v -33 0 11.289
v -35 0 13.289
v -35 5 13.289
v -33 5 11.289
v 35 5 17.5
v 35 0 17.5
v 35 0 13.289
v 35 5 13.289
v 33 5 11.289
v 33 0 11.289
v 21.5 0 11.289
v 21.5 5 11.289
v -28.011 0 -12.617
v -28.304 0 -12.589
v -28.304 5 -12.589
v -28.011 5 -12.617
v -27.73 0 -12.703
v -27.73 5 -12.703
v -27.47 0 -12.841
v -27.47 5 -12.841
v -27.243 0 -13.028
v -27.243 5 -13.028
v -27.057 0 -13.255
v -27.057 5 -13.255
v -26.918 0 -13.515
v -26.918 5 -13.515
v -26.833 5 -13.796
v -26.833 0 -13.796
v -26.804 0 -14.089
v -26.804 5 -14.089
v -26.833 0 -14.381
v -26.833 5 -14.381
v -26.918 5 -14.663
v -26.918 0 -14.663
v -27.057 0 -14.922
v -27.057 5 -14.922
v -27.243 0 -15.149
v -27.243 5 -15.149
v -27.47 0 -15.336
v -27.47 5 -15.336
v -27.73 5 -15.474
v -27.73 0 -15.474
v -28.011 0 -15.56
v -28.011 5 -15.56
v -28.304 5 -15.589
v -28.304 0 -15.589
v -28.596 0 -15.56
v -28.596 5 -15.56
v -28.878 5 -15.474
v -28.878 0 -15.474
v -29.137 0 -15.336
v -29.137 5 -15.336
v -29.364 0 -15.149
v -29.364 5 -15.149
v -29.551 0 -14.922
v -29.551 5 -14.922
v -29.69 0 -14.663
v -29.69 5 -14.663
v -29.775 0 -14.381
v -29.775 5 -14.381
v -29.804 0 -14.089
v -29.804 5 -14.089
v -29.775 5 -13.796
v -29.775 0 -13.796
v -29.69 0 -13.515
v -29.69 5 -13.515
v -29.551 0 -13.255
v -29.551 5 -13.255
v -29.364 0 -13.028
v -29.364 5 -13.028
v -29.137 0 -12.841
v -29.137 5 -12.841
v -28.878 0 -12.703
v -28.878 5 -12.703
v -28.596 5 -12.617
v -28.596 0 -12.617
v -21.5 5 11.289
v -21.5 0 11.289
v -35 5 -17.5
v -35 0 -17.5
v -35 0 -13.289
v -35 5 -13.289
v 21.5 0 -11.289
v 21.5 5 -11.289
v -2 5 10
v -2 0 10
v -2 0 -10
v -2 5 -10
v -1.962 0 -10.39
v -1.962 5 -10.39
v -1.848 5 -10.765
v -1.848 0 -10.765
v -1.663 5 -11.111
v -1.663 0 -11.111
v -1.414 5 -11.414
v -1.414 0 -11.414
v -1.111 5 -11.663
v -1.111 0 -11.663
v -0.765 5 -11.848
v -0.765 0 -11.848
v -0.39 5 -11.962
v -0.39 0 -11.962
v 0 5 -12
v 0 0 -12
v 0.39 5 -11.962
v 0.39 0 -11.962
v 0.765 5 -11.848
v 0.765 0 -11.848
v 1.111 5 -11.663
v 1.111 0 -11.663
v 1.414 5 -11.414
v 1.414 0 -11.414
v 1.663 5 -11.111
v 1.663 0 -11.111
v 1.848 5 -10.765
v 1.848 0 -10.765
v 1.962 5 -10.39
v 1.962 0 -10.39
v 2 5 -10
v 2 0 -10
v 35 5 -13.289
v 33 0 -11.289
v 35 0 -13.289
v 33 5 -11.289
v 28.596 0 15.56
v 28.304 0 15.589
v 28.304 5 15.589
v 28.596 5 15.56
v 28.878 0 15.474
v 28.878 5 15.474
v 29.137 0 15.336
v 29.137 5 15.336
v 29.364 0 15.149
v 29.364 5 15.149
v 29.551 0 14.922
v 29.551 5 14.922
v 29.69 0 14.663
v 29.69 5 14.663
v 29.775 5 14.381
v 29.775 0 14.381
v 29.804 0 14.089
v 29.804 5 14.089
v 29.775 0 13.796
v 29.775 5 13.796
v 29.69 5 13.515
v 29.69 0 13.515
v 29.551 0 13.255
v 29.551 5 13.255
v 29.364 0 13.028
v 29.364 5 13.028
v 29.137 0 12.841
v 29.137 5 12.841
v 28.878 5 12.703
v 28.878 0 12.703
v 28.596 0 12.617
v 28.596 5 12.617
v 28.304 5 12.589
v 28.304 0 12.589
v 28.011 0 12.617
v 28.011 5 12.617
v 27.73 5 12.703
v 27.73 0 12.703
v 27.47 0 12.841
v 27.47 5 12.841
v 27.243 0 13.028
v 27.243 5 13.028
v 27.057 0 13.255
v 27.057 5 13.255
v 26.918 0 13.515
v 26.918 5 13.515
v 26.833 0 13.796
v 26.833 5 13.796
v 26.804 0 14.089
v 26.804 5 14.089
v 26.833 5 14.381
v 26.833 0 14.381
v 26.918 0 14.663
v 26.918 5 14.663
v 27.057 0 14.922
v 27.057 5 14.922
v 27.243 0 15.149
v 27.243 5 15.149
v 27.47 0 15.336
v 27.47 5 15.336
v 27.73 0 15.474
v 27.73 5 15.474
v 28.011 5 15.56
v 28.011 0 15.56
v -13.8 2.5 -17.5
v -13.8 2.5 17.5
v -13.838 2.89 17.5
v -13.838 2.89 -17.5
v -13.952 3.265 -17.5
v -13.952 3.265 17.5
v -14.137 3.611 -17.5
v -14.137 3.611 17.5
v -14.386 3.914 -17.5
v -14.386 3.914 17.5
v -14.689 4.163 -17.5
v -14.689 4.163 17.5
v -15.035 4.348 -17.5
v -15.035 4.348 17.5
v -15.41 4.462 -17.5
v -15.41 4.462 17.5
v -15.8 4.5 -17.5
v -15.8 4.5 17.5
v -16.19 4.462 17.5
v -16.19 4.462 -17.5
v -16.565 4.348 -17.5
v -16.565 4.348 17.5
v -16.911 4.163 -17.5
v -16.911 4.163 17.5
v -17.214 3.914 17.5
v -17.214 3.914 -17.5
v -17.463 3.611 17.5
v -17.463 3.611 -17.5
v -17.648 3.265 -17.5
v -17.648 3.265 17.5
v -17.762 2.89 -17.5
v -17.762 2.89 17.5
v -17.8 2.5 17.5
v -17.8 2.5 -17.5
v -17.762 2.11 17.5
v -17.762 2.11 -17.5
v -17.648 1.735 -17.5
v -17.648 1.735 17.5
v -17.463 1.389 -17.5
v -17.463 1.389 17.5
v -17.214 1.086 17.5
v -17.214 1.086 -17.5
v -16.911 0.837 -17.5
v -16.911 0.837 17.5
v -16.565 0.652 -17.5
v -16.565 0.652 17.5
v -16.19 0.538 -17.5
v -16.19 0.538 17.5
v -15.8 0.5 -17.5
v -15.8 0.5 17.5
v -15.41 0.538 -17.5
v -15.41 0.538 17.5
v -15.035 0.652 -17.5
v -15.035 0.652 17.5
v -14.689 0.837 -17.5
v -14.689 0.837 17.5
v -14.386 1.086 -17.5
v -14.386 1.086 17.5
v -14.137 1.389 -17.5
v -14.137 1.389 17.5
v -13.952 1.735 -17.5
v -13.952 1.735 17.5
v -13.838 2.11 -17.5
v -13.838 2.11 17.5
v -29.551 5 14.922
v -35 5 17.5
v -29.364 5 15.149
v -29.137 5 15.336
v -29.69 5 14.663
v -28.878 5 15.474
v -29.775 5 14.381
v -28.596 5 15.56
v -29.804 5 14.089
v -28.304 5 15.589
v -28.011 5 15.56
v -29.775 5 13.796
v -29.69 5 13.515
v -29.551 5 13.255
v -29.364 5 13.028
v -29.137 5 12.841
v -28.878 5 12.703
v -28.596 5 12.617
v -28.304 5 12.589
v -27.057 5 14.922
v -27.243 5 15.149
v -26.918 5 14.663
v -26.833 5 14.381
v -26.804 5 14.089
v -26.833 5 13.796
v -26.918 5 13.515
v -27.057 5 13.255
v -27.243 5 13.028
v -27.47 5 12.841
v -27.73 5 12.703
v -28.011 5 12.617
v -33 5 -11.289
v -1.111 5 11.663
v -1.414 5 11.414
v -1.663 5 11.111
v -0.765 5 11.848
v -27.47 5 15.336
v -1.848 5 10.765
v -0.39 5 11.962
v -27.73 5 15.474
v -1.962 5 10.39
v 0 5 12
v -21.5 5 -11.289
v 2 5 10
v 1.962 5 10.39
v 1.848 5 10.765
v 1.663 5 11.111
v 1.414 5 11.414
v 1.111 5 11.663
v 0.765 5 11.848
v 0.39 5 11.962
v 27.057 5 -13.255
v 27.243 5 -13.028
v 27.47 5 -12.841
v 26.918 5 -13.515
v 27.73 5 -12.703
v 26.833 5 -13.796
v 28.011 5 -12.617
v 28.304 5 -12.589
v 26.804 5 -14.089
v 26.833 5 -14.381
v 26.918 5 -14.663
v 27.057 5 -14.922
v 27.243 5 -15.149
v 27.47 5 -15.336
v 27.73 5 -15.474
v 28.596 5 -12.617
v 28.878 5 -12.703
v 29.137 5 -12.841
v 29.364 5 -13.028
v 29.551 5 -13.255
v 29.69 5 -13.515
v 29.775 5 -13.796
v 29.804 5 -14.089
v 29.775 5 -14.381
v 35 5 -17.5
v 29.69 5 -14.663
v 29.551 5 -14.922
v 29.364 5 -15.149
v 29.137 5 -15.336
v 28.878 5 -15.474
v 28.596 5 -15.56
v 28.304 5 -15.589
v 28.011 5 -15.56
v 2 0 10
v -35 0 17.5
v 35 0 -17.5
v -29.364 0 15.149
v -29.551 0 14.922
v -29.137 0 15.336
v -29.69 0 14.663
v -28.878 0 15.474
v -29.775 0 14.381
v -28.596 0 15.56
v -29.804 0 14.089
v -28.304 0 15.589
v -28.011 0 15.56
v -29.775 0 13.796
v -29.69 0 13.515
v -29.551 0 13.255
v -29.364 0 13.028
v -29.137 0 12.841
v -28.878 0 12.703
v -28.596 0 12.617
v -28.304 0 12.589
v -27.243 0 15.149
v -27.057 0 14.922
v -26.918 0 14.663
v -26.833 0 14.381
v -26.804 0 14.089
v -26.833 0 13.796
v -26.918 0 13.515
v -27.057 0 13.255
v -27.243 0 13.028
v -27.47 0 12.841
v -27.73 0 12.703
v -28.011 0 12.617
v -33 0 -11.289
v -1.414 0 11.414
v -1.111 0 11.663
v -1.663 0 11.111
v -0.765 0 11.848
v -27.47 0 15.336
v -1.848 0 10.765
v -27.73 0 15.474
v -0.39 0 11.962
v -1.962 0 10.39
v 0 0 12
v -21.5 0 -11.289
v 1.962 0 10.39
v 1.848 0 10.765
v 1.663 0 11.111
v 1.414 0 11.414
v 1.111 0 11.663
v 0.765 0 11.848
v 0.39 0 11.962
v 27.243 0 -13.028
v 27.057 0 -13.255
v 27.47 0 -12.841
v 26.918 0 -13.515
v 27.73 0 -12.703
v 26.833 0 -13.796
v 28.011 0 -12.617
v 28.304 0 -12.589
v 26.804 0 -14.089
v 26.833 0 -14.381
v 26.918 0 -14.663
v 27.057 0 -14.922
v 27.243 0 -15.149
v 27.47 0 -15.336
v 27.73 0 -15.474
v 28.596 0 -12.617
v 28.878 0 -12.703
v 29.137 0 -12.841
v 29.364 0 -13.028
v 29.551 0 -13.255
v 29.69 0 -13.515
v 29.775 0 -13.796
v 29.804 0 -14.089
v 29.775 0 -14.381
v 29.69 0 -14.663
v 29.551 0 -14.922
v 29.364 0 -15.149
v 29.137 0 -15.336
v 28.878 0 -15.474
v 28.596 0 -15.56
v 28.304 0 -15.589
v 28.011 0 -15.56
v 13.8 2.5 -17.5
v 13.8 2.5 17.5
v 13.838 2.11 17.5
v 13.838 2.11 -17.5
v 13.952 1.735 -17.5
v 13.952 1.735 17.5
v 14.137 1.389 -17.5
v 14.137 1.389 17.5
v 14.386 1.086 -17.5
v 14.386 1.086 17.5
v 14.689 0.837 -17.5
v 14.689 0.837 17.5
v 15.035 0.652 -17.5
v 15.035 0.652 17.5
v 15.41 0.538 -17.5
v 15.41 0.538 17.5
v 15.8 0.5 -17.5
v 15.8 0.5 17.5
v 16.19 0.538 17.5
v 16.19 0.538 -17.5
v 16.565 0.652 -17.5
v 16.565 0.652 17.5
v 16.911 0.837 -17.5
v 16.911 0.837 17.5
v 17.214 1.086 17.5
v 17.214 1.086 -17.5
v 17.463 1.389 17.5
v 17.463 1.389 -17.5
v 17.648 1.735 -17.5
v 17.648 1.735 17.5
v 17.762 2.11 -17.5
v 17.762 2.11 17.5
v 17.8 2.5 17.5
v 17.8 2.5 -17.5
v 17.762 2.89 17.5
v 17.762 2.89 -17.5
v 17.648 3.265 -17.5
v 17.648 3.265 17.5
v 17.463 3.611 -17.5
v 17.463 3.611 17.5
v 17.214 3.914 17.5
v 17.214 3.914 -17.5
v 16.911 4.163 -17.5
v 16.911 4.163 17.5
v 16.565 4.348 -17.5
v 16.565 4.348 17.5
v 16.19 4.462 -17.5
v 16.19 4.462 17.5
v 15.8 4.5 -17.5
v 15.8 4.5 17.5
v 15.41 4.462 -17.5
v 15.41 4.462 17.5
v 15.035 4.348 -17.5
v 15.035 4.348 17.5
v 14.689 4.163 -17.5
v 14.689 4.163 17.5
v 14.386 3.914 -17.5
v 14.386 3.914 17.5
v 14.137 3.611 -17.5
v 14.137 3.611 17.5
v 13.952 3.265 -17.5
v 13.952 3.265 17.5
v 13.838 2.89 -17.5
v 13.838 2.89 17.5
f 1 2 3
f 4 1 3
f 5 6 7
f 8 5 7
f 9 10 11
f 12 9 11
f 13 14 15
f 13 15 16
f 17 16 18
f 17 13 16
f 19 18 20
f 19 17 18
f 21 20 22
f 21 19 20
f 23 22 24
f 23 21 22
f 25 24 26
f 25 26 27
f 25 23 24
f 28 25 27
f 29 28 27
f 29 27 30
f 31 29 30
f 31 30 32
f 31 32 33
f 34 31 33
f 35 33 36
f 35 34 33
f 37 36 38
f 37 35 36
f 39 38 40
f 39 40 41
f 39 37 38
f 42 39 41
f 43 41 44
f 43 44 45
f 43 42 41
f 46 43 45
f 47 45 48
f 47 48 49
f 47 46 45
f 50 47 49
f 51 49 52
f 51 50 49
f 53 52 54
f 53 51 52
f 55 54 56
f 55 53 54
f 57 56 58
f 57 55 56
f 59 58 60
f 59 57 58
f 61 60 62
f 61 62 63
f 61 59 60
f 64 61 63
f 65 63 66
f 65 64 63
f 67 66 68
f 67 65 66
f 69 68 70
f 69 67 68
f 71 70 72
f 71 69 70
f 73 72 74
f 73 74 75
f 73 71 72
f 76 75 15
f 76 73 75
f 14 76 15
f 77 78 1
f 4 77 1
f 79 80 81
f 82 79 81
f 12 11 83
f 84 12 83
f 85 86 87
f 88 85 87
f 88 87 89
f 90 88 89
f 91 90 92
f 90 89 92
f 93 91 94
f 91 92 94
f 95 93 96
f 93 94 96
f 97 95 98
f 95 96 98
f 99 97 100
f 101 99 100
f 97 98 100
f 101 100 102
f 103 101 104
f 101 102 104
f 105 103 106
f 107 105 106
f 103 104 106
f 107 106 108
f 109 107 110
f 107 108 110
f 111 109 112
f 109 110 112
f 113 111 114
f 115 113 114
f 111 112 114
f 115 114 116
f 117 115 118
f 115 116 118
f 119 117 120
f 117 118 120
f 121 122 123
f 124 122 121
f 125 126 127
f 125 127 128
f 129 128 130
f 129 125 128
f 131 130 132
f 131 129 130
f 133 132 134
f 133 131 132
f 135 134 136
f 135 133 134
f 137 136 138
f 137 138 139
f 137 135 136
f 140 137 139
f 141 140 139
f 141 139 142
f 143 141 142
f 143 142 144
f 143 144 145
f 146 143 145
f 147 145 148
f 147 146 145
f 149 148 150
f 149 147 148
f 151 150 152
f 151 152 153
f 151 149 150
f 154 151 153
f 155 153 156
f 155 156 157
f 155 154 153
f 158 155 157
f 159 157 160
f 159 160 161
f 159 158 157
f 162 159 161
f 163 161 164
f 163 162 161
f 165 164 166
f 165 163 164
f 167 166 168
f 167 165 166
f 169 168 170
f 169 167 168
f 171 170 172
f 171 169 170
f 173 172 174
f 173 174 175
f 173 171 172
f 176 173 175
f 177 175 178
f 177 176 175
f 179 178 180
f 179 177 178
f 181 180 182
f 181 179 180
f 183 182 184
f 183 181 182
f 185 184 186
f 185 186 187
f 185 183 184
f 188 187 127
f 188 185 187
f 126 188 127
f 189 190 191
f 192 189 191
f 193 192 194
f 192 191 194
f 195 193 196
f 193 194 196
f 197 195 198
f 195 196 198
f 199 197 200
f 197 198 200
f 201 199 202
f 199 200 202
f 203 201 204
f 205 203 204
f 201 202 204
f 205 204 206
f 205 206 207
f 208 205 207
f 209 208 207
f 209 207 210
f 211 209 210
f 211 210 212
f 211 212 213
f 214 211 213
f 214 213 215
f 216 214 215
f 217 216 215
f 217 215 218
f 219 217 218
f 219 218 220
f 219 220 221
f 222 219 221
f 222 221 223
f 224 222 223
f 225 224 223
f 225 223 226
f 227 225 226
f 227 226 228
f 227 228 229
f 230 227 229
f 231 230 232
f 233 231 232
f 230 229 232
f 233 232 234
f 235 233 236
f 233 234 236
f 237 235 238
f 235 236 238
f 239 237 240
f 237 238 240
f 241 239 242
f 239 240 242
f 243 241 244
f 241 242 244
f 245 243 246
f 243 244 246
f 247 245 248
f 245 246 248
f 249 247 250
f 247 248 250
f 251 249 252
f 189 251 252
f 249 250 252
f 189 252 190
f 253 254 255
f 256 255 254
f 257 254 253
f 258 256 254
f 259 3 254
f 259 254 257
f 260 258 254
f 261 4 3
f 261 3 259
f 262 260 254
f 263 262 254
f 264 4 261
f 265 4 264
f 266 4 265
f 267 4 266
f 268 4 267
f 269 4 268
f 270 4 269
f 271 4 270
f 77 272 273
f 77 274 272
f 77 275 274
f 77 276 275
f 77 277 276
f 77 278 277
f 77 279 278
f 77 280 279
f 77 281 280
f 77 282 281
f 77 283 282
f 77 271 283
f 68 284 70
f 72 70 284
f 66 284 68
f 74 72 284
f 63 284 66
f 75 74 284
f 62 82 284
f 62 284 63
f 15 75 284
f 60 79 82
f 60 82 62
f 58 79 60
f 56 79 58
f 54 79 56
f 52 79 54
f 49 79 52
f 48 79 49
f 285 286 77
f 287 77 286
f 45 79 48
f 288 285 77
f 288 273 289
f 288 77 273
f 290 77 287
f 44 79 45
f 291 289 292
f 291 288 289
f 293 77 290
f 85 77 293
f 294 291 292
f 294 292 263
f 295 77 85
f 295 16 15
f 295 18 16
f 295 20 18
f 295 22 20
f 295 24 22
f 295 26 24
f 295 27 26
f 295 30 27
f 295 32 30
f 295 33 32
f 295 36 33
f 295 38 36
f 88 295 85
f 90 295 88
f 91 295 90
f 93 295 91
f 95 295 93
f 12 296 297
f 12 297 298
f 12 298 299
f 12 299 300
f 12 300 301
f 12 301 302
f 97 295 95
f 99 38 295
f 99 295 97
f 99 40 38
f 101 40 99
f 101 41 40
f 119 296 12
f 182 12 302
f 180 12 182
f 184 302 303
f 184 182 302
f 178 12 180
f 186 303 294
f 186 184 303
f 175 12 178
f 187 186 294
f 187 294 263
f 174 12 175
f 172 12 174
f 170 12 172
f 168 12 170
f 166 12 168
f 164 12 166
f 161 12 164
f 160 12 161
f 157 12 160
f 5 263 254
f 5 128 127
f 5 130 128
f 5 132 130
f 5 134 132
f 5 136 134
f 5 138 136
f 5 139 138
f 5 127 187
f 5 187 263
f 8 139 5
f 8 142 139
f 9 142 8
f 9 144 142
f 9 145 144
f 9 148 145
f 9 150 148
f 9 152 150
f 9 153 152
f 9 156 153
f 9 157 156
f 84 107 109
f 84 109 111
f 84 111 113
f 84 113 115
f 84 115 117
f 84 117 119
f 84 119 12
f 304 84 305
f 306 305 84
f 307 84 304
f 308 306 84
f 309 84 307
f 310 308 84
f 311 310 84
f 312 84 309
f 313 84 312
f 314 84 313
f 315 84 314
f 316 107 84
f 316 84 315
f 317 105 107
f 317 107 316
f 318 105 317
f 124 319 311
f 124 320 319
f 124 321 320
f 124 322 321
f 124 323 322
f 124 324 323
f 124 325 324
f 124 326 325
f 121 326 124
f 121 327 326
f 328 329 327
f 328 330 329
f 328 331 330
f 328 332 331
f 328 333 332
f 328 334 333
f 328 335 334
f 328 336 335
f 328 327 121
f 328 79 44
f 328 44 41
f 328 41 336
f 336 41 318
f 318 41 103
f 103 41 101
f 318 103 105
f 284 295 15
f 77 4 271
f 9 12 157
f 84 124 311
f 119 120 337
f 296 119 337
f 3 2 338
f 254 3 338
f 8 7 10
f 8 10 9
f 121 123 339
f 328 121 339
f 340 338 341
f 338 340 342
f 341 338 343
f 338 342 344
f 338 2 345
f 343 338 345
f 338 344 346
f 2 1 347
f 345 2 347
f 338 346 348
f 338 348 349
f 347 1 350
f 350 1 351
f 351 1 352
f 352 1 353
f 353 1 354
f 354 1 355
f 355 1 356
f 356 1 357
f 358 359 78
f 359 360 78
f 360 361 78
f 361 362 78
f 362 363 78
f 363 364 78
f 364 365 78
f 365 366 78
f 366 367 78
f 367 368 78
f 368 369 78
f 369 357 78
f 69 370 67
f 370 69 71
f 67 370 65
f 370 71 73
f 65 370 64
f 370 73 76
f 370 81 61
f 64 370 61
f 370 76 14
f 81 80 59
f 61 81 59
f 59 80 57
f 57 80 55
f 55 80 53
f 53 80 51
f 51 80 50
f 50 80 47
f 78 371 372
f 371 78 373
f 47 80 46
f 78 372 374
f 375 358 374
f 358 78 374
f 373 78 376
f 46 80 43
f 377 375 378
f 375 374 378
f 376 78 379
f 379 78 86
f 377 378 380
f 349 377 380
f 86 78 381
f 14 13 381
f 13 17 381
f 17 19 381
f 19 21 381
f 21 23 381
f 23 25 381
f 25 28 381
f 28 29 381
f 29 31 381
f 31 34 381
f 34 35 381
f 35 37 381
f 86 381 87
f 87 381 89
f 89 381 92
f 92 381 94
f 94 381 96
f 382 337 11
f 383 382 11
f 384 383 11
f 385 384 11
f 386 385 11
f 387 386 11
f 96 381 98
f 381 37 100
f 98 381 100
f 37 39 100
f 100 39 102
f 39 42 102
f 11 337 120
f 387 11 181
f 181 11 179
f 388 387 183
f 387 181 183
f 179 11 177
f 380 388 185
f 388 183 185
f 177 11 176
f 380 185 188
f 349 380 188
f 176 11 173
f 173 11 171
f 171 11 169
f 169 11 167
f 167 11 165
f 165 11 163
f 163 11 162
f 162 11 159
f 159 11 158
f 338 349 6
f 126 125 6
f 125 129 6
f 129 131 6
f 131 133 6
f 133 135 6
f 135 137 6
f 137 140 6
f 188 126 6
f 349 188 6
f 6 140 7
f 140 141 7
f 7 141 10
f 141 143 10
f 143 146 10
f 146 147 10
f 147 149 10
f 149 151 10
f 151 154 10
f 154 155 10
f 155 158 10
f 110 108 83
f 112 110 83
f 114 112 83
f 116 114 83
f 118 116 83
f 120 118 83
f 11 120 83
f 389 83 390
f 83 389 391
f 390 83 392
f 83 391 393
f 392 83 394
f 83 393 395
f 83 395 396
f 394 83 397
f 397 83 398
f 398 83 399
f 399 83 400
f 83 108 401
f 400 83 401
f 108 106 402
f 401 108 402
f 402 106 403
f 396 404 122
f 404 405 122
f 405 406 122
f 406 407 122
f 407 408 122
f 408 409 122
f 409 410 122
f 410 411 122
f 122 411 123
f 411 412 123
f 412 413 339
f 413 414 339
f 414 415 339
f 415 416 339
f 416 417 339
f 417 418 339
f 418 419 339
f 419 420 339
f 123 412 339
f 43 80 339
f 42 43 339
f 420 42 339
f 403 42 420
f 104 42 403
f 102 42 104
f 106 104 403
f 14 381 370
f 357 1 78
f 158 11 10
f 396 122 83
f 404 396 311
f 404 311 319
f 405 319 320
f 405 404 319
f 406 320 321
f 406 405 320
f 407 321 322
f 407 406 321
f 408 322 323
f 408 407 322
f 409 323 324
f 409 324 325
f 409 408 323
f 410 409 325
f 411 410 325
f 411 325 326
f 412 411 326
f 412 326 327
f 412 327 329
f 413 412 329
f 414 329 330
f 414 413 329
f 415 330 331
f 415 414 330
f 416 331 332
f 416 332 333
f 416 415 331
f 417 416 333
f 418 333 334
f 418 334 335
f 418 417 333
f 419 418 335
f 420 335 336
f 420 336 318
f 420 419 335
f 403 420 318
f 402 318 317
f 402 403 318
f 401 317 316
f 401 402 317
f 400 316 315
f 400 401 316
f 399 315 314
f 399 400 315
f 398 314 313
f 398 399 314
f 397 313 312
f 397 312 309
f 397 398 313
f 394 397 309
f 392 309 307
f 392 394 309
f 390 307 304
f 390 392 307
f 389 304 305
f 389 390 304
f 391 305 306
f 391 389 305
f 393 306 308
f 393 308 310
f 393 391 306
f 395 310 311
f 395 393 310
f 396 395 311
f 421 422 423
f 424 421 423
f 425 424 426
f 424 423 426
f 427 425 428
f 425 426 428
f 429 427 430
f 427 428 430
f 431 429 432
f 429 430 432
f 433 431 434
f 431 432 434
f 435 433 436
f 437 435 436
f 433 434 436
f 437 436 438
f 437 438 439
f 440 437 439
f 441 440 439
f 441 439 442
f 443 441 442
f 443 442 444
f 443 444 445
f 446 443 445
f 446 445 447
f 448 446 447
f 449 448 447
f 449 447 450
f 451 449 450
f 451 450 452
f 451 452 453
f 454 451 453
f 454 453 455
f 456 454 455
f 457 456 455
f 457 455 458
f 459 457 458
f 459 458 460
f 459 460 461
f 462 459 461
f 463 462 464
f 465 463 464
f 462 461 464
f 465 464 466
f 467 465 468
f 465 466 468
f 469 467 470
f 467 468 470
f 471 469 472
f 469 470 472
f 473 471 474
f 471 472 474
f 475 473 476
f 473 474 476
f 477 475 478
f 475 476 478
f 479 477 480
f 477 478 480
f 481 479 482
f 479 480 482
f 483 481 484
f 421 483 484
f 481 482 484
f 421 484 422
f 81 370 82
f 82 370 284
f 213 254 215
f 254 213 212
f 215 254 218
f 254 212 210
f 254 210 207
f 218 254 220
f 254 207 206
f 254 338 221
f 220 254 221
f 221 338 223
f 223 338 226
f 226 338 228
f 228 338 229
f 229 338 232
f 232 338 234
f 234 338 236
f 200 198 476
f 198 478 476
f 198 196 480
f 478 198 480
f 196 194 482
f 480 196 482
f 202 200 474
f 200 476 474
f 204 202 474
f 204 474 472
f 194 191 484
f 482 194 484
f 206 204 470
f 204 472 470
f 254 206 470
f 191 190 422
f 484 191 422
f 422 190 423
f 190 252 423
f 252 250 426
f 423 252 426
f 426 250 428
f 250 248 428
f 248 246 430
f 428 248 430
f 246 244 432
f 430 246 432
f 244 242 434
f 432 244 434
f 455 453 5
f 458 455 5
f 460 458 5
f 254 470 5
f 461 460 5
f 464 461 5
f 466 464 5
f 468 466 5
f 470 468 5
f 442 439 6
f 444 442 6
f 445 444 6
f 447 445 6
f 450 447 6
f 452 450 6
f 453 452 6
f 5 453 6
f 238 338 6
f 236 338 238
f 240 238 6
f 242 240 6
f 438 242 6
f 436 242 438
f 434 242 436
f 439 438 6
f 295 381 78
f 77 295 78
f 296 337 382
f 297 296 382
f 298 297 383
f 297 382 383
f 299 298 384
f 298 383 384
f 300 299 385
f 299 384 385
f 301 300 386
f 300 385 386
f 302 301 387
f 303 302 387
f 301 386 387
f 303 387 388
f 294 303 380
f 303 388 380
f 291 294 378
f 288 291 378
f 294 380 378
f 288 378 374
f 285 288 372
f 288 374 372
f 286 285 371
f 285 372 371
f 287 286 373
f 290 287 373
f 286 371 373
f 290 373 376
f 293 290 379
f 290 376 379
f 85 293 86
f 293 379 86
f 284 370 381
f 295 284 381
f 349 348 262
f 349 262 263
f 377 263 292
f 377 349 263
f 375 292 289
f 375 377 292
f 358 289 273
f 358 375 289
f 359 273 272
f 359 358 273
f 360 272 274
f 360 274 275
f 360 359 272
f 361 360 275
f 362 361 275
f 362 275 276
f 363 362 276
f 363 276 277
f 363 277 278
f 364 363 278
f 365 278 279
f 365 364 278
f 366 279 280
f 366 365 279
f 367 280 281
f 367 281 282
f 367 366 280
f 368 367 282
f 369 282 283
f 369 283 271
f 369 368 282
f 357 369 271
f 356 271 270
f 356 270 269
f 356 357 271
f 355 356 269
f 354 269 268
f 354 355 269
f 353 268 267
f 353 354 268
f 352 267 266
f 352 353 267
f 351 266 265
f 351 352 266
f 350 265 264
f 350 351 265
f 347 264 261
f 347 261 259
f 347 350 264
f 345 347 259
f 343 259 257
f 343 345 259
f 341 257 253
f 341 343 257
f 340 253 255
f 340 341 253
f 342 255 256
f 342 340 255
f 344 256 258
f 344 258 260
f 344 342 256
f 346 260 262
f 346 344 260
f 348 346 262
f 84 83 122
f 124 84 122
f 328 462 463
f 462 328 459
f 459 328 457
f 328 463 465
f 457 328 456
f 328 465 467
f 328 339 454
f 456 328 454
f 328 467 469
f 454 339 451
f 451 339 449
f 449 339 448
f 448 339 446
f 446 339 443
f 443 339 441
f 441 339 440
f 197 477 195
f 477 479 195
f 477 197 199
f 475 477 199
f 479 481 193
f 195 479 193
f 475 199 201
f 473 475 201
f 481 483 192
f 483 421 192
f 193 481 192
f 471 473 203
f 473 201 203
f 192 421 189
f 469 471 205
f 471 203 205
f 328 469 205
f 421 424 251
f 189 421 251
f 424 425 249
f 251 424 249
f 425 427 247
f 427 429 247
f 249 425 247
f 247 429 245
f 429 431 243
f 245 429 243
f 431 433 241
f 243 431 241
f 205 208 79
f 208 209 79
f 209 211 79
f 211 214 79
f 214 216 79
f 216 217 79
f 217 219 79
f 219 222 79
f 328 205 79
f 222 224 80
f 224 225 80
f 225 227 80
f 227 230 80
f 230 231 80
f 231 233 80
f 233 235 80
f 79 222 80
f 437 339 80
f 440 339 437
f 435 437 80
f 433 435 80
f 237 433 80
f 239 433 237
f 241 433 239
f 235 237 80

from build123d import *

# Parameters (mm, degrees)
SKETCH_1_R          = 1.5
EXTRUDE_1_DEPTH     = 5
CHAMFER_1_SIZE      = 2
SKETCH_2_R          = 2
CUT_EXTRUDE_1_DEPTH = 50.749371855


with BuildPart() as part:
    # 草图1 → 凸台-拉伸1 (new body)
    with BuildSketch(Plane(origin=(0, 0, 0), x_dir=(1, 0, 0), z_dir=(0, 1, 0))):
        Polygon((35, 17.5), (-35, 17.5), (-35, 11.288596674), (-21.49999999, 11.288596674), (-21.49999999, -11.288596674), (-35, -11.288596674), (-35, -17.5), (35, -17.5), (35, -11.288596674), (21.49999999, -11.288596674), (21.49999999, 11.288596674), (35, 11.288596674), align=None)
        with Locations(Location((-28.303727501, -14.088596674, 0), (0, 0, 270))):
            Circle(SKETCH_1_R, mode=Mode.SUBTRACT)
        with Locations(Location((28.303727501, -14.088596674, 0), (0, 0, 270))):
            Circle(SKETCH_1_R, mode=Mode.SUBTRACT)
        with BuildLine():
            ThreePointArc((-2, 10), (0, 12), (2, 10))
            Line((2, 10), (2, -10))
            ThreePointArc((2, -10), (0, -12), (-2, -10))
            Line((-2, -10), (-2, 10))
        make_face(mode=Mode.SUBTRACT)
        with Locations(Location((-28.303727501, 14.088596674, 0), (0, 0, 270))):
            Circle(SKETCH_1_R, mode=Mode.SUBTRACT)
        with Locations(Location((28.303727501, 14.088596674, 0), (0, 0, 270))):
            Circle(SKETCH_1_R, mode=Mode.SUBTRACT)
    extrude(amount=EXTRUDE_1_DEPTH)

    # 倒角1
    chamfer_1_edges = [part.edges().sort_by_distance(p)[0] for p in [
        (35, 2.5, 11.288596674),
        (-35, 2.5, 11.288596674),
        (-35, 2.5, -11.288596674),
        (35, 2.5, -11.288596674),
    ]]
    chamfer(chamfer_1_edges, length=CHAMFER_1_SIZE)

    # 草图2 → 切除-拉伸1 (cut, through all)
    with BuildSketch(Plane.XY.offset(17.5)):
        with Locations((-15.8, 2.5)):
            Circle(SKETCH_2_R)
        with Locations(Location((15.8, 2.5, 0), (0, 0, 180))):
            Circle(SKETCH_2_R)
    extrude(amount=-CUT_EXTRUDE_1_DEPTH, mode=Mode.SUBTRACT)


solid = part.part
